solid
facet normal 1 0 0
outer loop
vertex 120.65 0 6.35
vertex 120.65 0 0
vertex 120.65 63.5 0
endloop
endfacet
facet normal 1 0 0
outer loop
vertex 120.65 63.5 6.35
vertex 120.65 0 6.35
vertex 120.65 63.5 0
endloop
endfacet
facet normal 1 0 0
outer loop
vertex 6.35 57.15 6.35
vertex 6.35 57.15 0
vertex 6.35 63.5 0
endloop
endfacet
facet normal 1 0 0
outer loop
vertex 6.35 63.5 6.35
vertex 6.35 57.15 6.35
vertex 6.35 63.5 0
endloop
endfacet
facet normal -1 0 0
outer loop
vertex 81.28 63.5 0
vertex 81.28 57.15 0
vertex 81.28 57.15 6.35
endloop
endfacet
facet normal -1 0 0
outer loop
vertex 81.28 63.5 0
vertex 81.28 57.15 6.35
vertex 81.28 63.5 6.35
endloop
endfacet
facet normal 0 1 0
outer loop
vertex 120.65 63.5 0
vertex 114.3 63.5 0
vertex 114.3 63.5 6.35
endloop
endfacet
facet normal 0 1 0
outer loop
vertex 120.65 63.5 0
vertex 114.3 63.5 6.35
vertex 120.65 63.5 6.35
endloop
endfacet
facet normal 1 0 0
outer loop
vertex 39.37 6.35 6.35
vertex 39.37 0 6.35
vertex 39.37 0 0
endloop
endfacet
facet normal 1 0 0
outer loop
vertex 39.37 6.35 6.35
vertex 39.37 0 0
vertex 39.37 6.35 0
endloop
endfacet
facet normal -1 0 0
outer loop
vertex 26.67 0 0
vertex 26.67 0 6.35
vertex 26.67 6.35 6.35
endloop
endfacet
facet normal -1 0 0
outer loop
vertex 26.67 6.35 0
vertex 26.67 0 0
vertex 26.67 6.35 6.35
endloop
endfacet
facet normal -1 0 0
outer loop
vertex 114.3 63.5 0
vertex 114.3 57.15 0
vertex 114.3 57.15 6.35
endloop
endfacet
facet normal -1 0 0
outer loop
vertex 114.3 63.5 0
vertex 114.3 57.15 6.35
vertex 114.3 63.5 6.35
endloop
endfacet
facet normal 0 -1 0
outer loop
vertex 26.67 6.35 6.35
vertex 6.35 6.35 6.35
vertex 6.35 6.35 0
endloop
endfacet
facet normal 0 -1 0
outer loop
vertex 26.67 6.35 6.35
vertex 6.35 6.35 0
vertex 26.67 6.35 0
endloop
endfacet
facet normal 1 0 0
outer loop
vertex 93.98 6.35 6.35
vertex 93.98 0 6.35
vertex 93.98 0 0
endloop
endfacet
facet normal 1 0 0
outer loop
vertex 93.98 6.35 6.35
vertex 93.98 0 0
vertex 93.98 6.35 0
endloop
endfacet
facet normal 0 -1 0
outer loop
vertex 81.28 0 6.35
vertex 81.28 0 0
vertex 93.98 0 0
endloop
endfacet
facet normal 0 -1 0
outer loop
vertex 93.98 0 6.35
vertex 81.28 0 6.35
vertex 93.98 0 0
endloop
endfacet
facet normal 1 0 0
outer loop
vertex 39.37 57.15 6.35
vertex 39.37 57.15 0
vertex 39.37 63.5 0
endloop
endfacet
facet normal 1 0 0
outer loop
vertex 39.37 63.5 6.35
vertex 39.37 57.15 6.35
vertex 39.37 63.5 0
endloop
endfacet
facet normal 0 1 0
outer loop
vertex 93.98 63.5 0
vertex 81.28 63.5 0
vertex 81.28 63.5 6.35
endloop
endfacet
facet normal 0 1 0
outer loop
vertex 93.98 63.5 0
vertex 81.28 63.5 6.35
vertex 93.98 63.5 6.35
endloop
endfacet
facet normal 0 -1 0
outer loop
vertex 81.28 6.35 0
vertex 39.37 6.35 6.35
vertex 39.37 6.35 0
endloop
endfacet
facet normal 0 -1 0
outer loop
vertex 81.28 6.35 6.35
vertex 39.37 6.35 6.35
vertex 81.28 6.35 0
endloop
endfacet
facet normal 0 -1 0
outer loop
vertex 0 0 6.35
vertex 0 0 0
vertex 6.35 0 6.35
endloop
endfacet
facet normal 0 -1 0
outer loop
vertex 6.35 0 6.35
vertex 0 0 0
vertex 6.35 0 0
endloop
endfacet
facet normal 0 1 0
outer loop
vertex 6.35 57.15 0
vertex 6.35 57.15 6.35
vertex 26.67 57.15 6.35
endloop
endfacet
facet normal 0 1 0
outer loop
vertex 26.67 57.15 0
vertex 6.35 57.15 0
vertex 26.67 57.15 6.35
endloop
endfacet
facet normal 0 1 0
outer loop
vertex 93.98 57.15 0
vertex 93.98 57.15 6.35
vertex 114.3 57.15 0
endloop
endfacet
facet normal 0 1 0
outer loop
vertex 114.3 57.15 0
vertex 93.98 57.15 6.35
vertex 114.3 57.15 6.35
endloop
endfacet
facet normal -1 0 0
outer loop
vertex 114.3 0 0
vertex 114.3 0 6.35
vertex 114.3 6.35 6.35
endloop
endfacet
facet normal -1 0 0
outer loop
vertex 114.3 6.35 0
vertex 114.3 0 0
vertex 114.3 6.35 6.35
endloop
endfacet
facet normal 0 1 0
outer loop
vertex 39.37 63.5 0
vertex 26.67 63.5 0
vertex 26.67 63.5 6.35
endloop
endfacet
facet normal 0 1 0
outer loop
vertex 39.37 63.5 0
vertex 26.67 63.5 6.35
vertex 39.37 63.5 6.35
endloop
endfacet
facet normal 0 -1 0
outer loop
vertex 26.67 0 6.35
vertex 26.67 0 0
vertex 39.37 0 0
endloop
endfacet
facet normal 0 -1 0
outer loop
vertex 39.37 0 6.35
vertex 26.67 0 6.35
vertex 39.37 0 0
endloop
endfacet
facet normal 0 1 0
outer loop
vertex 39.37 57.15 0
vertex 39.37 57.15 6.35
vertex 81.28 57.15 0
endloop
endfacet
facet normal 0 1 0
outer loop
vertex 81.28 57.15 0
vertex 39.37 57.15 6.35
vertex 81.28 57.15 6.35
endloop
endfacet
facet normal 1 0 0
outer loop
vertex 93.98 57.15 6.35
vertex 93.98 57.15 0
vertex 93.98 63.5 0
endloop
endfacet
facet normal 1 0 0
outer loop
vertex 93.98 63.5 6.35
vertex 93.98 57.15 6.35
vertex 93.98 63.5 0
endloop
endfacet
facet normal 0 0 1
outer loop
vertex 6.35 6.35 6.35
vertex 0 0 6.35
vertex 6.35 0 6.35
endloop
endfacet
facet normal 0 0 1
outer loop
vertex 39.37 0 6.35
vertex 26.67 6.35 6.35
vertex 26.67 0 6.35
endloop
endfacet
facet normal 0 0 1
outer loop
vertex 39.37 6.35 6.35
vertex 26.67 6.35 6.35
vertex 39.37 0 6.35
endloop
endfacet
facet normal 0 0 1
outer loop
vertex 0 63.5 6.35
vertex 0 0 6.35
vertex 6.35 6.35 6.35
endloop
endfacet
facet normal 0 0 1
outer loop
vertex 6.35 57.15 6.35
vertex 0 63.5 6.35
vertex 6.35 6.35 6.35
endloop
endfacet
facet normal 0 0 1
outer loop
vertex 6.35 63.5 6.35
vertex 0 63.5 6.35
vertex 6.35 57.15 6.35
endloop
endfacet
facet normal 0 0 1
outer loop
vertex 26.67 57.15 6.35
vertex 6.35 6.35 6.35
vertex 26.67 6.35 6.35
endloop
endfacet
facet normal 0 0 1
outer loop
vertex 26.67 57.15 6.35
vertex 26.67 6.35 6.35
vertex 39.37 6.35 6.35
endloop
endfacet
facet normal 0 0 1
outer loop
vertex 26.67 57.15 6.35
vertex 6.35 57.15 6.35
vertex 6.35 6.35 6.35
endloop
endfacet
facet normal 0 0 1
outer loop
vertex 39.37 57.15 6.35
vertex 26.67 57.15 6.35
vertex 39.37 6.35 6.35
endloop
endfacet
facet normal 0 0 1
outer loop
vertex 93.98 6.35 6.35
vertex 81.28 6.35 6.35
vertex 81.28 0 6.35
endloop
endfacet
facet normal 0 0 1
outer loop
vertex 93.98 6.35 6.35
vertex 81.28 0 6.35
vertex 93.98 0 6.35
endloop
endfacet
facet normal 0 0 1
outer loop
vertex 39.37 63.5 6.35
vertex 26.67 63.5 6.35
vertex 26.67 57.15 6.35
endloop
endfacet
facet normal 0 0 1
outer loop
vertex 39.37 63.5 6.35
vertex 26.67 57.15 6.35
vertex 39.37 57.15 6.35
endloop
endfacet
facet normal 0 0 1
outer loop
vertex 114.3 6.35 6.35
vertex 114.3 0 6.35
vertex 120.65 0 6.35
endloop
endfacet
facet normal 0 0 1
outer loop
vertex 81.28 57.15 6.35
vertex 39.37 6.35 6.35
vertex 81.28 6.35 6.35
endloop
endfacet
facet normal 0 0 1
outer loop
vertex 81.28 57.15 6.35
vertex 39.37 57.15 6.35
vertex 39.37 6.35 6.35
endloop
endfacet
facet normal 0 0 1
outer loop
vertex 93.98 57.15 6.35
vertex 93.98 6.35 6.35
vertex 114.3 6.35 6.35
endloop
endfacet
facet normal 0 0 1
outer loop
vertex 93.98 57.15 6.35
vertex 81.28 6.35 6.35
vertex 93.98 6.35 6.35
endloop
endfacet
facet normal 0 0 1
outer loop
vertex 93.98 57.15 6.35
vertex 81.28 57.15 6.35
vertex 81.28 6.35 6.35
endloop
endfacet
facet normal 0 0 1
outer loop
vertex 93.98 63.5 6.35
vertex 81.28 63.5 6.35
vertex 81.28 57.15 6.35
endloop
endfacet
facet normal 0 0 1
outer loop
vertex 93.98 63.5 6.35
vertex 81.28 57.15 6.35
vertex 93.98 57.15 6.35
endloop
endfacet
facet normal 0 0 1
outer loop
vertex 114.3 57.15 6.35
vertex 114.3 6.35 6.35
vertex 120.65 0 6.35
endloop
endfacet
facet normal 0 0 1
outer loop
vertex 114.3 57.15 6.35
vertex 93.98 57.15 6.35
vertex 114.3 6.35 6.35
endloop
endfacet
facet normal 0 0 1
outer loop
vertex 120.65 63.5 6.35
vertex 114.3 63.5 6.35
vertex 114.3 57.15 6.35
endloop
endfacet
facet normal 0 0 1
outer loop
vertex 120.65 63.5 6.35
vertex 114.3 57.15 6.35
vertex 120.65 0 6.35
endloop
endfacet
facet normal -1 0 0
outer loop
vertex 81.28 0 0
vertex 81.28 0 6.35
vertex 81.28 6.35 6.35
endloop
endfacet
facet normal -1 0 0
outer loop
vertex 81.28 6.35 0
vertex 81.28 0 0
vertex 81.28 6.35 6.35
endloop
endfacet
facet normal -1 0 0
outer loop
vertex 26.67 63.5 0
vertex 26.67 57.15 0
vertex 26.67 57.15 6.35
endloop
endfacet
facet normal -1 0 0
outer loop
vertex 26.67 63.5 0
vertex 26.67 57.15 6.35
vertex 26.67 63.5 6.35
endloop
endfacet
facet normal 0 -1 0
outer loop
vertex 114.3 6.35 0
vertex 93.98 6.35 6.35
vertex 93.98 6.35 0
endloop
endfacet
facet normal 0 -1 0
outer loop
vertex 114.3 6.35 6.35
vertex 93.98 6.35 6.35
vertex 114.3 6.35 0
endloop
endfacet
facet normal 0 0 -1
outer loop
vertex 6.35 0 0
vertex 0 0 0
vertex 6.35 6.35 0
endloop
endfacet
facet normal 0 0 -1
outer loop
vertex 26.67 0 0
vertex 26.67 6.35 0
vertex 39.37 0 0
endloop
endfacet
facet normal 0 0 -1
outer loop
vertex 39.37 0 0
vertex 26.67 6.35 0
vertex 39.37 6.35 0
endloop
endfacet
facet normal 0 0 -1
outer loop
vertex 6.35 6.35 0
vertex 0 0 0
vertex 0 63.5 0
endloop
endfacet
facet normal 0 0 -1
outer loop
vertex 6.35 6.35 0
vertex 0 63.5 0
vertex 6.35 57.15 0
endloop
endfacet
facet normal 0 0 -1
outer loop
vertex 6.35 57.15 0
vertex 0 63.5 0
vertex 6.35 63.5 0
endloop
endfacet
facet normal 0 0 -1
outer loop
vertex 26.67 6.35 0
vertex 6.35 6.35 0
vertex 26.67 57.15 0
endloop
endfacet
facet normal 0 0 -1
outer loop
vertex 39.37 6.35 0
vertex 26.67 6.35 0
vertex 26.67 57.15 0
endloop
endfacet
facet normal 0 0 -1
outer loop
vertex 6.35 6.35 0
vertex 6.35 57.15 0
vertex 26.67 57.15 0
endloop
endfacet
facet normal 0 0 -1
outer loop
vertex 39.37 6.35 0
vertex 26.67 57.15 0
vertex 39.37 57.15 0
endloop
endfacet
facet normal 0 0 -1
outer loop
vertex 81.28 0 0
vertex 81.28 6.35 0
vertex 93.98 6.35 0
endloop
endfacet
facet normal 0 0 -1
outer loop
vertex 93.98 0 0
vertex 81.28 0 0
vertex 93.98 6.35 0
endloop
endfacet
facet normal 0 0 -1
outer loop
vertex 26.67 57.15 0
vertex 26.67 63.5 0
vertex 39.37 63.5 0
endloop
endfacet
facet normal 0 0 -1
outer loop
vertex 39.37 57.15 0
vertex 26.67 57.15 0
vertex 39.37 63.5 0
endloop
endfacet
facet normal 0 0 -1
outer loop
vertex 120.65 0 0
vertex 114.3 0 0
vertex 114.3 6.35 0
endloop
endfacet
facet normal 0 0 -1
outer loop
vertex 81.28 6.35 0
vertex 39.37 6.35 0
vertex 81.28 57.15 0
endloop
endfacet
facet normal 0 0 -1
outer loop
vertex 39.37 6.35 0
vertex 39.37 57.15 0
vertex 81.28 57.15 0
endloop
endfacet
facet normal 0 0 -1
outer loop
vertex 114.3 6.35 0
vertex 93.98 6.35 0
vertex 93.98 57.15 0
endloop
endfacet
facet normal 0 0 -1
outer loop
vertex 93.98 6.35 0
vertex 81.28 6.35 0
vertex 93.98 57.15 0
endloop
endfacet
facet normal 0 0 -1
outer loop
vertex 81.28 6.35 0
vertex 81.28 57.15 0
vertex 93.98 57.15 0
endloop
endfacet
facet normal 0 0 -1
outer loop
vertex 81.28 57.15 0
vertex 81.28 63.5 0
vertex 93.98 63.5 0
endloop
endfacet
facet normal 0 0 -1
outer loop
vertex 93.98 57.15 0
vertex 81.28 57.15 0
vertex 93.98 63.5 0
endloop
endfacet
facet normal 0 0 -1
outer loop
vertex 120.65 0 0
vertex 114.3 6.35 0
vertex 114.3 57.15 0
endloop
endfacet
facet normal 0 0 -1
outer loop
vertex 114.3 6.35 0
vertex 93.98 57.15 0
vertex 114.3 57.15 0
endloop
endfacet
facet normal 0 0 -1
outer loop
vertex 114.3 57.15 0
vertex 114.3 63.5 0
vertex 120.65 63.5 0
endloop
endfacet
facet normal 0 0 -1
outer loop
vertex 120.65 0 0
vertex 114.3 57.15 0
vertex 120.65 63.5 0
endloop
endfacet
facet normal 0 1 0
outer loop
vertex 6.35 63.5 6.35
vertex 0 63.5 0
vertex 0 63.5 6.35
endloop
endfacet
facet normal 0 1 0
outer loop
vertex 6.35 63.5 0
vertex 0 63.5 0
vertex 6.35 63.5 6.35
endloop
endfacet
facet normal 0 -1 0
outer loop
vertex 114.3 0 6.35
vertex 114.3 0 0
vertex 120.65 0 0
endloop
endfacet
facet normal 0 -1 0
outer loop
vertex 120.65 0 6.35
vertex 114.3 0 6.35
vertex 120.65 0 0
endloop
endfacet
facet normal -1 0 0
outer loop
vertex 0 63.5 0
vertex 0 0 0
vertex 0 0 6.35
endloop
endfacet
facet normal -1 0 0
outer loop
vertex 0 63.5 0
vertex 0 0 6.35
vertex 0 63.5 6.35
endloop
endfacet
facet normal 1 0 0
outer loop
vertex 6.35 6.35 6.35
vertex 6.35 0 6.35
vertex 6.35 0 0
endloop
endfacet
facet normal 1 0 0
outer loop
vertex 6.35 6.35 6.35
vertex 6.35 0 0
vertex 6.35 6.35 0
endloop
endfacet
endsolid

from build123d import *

# Parameters (mm, degrees)
SKETCH1_W           = 120.65
SKETCH1_H           = 63.5
BOSS_EXTRUDE1_DEPTH = 6.35
CUT_EXTRUDE1_REACH  = 138.488
SKETCH2_W           = 20.32
SKETCH2_H           = 6.35
SKETCH2_W_2         = 41.91


with BuildPart() as part:
    # Sketch1 → Boss-Extrude1 (new body)
    with BuildSketch(Plane.XY):
        with Locations((60.325, 31.75)):
            Rectangle(SKETCH1_W, SKETCH1_H)
    extrude(amount=BOSS_EXTRUDE1_DEPTH)

    # Sketch2 → Cut-Extrude1 (cut, up to next)
    with BuildSketch(Plane.XY.offset(6.35), mode=Mode.PRIVATE) as cut_extrude1_sk1:
        with Locations((16.51, 60.325)):
            Rectangle(SKETCH2_W, SKETCH2_H)
    cut_extrude1_tool1 = extrude(cut_extrude1_sk1.sketch, amount=-CUT_EXTRUDE1_REACH, mode=Mode.PRIVATE) & part.part
    # Sketch2 → Cut-Extrude1 (cut, up to next)
    with BuildSketch(Plane.XY.offset(6.35), mode=Mode.PRIVATE) as cut_extrude1_sk2:
        with Locations((60.325, 60.325)):
            Rectangle(SKETCH2_W_2, SKETCH2_H)
    cut_extrude1_tool2 = extrude(cut_extrude1_sk2.sketch, amount=-CUT_EXTRUDE1_REACH, mode=Mode.PRIVATE) & part.part
    # Sketch2 → Cut-Extrude1 (cut, up to next)
    with BuildSketch(Plane.XY.offset(6.35), mode=Mode.PRIVATE) as cut_extrude1_sk3:
        with Locations((104.14, 60.325)):
            Rectangle(SKETCH2_W, SKETCH2_H)
    cut_extrude1_tool3 = extrude(cut_extrude1_sk3.sketch, amount=-CUT_EXTRUDE1_REACH, mode=Mode.PRIVATE) & part.part
    # Sketch2 → Cut-Extrude1 (cut, up to next)
    with BuildSketch(Plane.XY.offset(6.35), mode=Mode.PRIVATE) as cut_extrude1_sk4:
        with Locations((104.14, 3.175)):
            Rectangle(SKETCH2_W, SKETCH2_H)
    cut_extrude1_tool4 = extrude(cut_extrude1_sk4.sketch, amount=-CUT_EXTRUDE1_REACH, mode=Mode.PRIVATE) & part.part
    # Sketch2 → Cut-Extrude1 (cut, up to next)
    with BuildSketch(Plane.XY.offset(6.35), mode=Mode.PRIVATE) as cut_extrude1_sk5:
        with Locations((60.325, 3.175)):
            Rectangle(SKETCH2_W_2, SKETCH2_H)
    cut_extrude1_tool5 = extrude(cut_extrude1_sk5.sketch, amount=-CUT_EXTRUDE1_REACH, mode=Mode.PRIVATE) & part.part
    # Sketch2 → Cut-Extrude1 (cut, up to next)
    with BuildSketch(Plane.XY.offset(6.35), mode=Mode.PRIVATE) as cut_extrude1_sk6:
        with Locations((16.51, 3.175)):
            Rectangle(SKETCH2_W, SKETCH2_H)
    cut_extrude1_tool6 = extrude(cut_extrude1_sk6.sketch, amount=-CUT_EXTRUDE1_REACH, mode=Mode.PRIVATE) & part.part
    add(cut_extrude1_tool1.solids().sort_by_distance((16.51, 60.325, 6.35))[0], mode=Mode.SUBTRACT)
    add(cut_extrude1_tool2.solids().sort_by_distance((60.325, 60.325, 6.35))[0], mode=Mode.SUBTRACT)
    add(cut_extrude1_tool3.solids().sort_by_distance((104.14, 60.325, 6.35))[0], mode=Mode.SUBTRACT)
    add(cut_extrude1_tool4.solids().sort_by_distance((104.14, 3.175, 6.35))[0], mode=Mode.SUBTRACT)
    add(cut_extrude1_tool5.solids().sort_by_distance((60.325, 3.175, 6.35))[0], mode=Mode.SUBTRACT)
    add(cut_extrude1_tool6.solids().sort_by_distance((16.51, 3.175, 6.35))[0], mode=Mode.SUBTRACT)


solid = part.part
